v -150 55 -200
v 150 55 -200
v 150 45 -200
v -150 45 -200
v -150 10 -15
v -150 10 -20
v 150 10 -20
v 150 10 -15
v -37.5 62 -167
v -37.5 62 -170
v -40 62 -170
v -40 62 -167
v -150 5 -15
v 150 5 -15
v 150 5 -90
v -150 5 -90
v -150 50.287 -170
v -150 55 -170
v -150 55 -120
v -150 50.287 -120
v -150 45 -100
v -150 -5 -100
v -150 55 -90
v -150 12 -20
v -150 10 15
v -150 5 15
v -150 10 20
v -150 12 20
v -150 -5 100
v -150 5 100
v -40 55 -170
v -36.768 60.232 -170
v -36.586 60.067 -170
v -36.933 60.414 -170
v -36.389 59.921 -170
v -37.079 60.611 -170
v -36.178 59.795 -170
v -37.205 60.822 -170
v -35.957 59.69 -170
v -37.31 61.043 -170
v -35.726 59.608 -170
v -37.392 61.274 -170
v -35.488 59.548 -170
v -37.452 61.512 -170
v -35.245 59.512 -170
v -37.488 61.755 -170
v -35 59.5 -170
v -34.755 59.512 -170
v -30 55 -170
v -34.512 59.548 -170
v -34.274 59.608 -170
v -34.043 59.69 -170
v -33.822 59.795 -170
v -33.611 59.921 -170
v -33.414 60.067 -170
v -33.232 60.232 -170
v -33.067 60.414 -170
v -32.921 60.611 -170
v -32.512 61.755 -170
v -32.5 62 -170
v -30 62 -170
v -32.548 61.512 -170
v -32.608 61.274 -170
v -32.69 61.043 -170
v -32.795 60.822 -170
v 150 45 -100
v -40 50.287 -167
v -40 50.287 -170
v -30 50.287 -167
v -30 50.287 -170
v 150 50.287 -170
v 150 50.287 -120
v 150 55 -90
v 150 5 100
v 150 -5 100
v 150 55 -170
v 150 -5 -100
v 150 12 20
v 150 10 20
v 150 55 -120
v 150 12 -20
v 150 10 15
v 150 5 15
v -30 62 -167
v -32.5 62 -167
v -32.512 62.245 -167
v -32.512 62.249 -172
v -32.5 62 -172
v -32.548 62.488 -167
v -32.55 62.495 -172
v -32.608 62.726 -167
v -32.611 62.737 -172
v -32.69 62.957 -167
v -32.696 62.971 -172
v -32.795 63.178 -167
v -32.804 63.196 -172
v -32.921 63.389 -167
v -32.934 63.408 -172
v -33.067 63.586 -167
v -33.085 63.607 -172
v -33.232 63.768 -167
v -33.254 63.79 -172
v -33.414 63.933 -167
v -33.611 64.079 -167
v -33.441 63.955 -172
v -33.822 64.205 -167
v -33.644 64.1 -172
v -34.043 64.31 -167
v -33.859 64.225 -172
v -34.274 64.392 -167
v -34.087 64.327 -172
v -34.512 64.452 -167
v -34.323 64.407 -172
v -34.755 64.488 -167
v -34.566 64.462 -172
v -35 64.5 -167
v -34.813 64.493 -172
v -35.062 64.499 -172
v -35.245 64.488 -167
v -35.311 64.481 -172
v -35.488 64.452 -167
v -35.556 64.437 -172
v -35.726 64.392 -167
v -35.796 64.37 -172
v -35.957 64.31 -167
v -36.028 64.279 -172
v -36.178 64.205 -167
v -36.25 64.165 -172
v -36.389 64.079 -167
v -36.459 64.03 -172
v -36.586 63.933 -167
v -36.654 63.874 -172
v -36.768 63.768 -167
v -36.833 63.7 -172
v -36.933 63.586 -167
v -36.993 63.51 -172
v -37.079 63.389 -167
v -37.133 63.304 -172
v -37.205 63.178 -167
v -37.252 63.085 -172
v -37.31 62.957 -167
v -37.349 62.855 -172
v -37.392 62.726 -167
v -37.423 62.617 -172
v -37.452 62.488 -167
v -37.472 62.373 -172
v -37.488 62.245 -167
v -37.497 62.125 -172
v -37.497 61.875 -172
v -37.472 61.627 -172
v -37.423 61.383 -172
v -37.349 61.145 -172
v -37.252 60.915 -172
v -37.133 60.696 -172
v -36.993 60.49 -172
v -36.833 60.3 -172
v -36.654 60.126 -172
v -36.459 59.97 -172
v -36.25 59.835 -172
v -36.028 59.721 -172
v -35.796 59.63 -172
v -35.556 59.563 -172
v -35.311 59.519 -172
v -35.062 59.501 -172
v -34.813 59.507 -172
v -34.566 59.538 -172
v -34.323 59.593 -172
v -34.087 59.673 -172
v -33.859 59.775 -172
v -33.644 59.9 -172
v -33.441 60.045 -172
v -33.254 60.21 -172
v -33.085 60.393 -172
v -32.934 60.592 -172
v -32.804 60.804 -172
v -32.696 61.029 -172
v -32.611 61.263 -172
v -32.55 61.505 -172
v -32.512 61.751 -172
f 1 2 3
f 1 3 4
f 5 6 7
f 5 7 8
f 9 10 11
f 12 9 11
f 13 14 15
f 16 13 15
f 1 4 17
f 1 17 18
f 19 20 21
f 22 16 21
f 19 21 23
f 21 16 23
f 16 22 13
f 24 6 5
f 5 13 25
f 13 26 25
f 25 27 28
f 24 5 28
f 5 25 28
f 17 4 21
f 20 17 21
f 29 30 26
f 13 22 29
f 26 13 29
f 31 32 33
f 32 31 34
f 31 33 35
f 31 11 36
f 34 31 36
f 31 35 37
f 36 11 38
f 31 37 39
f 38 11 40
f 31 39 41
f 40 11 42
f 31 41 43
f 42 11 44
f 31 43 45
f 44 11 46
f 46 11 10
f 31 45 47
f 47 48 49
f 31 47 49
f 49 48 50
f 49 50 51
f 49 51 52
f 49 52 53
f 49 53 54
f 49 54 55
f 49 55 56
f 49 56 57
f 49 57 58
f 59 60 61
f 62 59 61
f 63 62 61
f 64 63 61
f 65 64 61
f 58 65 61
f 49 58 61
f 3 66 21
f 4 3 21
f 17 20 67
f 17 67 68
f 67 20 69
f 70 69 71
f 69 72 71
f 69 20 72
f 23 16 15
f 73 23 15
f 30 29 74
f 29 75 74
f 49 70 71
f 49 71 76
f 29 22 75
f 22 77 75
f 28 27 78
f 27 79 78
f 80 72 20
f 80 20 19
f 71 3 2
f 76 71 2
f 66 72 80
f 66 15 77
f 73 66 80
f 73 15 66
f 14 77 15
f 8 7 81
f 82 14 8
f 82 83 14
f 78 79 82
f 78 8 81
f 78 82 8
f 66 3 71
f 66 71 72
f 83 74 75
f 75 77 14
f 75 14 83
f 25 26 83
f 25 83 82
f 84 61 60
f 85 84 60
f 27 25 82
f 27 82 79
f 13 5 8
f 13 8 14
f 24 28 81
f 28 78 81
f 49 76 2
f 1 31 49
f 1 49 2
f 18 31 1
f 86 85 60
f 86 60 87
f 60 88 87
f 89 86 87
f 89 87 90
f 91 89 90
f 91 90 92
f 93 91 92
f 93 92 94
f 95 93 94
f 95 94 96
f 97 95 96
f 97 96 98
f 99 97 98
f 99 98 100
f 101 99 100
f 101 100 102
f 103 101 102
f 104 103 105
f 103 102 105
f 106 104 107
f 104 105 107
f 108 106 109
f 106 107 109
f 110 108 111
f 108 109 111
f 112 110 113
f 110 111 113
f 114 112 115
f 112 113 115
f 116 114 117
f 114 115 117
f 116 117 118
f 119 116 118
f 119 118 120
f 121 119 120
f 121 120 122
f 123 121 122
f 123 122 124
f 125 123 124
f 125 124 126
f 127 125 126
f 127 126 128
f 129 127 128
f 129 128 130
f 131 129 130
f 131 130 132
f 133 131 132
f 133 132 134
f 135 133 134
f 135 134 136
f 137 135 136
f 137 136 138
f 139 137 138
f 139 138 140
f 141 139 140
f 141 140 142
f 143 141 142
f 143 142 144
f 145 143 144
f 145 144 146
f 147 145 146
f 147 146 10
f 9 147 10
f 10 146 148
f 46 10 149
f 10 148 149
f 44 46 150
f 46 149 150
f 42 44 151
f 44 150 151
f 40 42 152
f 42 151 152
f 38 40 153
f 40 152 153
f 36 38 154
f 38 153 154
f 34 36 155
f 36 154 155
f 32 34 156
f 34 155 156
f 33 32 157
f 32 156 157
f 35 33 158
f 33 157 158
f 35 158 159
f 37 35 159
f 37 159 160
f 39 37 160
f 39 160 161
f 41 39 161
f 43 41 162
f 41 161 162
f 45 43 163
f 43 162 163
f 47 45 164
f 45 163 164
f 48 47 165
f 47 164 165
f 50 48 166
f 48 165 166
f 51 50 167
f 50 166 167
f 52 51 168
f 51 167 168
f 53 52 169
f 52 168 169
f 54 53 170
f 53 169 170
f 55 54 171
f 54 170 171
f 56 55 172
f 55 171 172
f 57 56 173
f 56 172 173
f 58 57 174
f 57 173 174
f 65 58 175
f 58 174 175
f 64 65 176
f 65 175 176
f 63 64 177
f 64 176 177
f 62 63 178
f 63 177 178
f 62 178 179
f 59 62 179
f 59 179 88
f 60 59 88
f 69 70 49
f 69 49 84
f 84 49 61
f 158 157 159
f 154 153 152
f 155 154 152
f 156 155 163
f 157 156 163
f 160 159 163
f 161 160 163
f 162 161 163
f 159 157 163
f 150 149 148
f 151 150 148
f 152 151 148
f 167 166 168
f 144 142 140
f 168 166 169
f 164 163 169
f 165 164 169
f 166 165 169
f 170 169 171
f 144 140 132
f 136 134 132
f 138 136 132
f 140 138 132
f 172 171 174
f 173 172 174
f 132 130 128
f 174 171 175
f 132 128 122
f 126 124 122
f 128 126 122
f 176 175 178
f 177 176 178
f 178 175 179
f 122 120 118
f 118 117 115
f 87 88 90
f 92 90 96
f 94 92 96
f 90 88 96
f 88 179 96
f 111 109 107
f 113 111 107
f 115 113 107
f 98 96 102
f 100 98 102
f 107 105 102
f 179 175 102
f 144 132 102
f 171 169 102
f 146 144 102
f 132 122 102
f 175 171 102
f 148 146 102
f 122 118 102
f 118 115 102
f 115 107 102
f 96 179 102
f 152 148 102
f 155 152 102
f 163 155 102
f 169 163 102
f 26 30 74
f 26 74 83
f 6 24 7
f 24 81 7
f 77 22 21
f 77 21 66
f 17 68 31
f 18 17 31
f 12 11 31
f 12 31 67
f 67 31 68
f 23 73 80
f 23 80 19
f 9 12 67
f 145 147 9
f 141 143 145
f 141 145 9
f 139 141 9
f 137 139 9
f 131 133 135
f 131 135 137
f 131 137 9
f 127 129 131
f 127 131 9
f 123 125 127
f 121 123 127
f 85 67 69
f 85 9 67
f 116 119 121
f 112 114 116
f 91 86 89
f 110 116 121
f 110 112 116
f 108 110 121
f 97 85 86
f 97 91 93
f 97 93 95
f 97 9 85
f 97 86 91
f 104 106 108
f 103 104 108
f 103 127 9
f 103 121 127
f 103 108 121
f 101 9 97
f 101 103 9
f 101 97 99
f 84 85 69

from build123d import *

# Parameters (mm, degrees)
EXTRUDE1_DEPTH = 150
SKETCH3_W      = 300
SKETCH3_H      = 10
EXTRUDE2_DEPTH = 50
SKETCH4_W      = 300
SKETCH4_H      = 10
EXTRUDE3_DEPTH = 100
SKETCH5_W      = 50
SKETCH5_H      = 16.996037372
EXTRUDE4_DEPTH = 365.725924497
EXTRUDE5_DEPTH = 3
EXTRUDE6_START = -5
SKETCH7_R      = 2.5
EXTRUDE6_DEPTH = 5


with BuildPart() as part:
    # Sketch1 → Extrude1 (new, symmetric)
    with BuildSketch(Plane(origin=(0, 0, 0), x_dir=(0, 0, -1), z_dir=(1, 0, 0))):
        Polygon((15, 5), (100, 5), (100, -5), (-100, -5), (-100, 5), (-15, 5), (-15, 10), (-20, 10), (-20, 12), (20, 12), (20, 10), (15, 10), align=None)
    extrude(amount=EXTRUDE1_DEPTH, both=True)

    # Sketch3 → Extrude2 (add)
    with BuildSketch(Plane(origin=(0, 5, 0), x_dir=(1, 0, 0), z_dir=(0, 1, 0))):
        with Locations((0, 95)):
            Rectangle(SKETCH3_W, SKETCH3_H)
    extrude(amount=EXTRUDE2_DEPTH)

    # Sketch4 → Extrude3 (add)
    with BuildSketch(Plane(origin=(0, 0, -100), x_dir=(-1, 0, 0), z_dir=(0, 0, -1))):
        with Locations((0, 50)):
            Rectangle(SKETCH4_W, SKETCH4_H)
    extrude(amount=EXTRUDE3_DEPTH)

    # Sketch5 → Extrude4 (cut, through all)
    with BuildSketch(Plane(origin=(150, 0, 0), x_dir=(0, 0, -1), z_dir=(1, 0, 0))):
        with Locations((145, 58.784793496)):
            Rectangle(SKETCH5_W, SKETCH5_H)
    extrude(amount=-EXTRUDE4_DEPTH, mode=Mode.SUBTRACT)

    # Sketch6 → Extrude5 (add)
    with BuildSketch(Plane(origin=(0, 0, -170), x_dir=(-1, 0, 0), z_dir=(0, 0, -1))):
        with BuildLine():
            Line((30, 62), (32.5, 62))
            ThreePointArc((32.5, 62), (35, 64.5), (37.5, 62))
            Line((37.5, 62), (40, 62))
            Line((40, 62), (40, 45))
            Line((40, 45), (30, 45))
            Line((30, 45), (30, 62))
        make_face()
    extrude(amount=-EXTRUDE5_DEPTH)

    # Sketch7 → Extrude6 (add)
    with BuildSketch(Plane.XY.offset(-167).offset(EXTRUDE6_START)):
        with Locations((-35, 62)):
            Circle(SKETCH7_R)
    extrude(amount=EXTRUDE6_DEPTH)


solid = part.part
